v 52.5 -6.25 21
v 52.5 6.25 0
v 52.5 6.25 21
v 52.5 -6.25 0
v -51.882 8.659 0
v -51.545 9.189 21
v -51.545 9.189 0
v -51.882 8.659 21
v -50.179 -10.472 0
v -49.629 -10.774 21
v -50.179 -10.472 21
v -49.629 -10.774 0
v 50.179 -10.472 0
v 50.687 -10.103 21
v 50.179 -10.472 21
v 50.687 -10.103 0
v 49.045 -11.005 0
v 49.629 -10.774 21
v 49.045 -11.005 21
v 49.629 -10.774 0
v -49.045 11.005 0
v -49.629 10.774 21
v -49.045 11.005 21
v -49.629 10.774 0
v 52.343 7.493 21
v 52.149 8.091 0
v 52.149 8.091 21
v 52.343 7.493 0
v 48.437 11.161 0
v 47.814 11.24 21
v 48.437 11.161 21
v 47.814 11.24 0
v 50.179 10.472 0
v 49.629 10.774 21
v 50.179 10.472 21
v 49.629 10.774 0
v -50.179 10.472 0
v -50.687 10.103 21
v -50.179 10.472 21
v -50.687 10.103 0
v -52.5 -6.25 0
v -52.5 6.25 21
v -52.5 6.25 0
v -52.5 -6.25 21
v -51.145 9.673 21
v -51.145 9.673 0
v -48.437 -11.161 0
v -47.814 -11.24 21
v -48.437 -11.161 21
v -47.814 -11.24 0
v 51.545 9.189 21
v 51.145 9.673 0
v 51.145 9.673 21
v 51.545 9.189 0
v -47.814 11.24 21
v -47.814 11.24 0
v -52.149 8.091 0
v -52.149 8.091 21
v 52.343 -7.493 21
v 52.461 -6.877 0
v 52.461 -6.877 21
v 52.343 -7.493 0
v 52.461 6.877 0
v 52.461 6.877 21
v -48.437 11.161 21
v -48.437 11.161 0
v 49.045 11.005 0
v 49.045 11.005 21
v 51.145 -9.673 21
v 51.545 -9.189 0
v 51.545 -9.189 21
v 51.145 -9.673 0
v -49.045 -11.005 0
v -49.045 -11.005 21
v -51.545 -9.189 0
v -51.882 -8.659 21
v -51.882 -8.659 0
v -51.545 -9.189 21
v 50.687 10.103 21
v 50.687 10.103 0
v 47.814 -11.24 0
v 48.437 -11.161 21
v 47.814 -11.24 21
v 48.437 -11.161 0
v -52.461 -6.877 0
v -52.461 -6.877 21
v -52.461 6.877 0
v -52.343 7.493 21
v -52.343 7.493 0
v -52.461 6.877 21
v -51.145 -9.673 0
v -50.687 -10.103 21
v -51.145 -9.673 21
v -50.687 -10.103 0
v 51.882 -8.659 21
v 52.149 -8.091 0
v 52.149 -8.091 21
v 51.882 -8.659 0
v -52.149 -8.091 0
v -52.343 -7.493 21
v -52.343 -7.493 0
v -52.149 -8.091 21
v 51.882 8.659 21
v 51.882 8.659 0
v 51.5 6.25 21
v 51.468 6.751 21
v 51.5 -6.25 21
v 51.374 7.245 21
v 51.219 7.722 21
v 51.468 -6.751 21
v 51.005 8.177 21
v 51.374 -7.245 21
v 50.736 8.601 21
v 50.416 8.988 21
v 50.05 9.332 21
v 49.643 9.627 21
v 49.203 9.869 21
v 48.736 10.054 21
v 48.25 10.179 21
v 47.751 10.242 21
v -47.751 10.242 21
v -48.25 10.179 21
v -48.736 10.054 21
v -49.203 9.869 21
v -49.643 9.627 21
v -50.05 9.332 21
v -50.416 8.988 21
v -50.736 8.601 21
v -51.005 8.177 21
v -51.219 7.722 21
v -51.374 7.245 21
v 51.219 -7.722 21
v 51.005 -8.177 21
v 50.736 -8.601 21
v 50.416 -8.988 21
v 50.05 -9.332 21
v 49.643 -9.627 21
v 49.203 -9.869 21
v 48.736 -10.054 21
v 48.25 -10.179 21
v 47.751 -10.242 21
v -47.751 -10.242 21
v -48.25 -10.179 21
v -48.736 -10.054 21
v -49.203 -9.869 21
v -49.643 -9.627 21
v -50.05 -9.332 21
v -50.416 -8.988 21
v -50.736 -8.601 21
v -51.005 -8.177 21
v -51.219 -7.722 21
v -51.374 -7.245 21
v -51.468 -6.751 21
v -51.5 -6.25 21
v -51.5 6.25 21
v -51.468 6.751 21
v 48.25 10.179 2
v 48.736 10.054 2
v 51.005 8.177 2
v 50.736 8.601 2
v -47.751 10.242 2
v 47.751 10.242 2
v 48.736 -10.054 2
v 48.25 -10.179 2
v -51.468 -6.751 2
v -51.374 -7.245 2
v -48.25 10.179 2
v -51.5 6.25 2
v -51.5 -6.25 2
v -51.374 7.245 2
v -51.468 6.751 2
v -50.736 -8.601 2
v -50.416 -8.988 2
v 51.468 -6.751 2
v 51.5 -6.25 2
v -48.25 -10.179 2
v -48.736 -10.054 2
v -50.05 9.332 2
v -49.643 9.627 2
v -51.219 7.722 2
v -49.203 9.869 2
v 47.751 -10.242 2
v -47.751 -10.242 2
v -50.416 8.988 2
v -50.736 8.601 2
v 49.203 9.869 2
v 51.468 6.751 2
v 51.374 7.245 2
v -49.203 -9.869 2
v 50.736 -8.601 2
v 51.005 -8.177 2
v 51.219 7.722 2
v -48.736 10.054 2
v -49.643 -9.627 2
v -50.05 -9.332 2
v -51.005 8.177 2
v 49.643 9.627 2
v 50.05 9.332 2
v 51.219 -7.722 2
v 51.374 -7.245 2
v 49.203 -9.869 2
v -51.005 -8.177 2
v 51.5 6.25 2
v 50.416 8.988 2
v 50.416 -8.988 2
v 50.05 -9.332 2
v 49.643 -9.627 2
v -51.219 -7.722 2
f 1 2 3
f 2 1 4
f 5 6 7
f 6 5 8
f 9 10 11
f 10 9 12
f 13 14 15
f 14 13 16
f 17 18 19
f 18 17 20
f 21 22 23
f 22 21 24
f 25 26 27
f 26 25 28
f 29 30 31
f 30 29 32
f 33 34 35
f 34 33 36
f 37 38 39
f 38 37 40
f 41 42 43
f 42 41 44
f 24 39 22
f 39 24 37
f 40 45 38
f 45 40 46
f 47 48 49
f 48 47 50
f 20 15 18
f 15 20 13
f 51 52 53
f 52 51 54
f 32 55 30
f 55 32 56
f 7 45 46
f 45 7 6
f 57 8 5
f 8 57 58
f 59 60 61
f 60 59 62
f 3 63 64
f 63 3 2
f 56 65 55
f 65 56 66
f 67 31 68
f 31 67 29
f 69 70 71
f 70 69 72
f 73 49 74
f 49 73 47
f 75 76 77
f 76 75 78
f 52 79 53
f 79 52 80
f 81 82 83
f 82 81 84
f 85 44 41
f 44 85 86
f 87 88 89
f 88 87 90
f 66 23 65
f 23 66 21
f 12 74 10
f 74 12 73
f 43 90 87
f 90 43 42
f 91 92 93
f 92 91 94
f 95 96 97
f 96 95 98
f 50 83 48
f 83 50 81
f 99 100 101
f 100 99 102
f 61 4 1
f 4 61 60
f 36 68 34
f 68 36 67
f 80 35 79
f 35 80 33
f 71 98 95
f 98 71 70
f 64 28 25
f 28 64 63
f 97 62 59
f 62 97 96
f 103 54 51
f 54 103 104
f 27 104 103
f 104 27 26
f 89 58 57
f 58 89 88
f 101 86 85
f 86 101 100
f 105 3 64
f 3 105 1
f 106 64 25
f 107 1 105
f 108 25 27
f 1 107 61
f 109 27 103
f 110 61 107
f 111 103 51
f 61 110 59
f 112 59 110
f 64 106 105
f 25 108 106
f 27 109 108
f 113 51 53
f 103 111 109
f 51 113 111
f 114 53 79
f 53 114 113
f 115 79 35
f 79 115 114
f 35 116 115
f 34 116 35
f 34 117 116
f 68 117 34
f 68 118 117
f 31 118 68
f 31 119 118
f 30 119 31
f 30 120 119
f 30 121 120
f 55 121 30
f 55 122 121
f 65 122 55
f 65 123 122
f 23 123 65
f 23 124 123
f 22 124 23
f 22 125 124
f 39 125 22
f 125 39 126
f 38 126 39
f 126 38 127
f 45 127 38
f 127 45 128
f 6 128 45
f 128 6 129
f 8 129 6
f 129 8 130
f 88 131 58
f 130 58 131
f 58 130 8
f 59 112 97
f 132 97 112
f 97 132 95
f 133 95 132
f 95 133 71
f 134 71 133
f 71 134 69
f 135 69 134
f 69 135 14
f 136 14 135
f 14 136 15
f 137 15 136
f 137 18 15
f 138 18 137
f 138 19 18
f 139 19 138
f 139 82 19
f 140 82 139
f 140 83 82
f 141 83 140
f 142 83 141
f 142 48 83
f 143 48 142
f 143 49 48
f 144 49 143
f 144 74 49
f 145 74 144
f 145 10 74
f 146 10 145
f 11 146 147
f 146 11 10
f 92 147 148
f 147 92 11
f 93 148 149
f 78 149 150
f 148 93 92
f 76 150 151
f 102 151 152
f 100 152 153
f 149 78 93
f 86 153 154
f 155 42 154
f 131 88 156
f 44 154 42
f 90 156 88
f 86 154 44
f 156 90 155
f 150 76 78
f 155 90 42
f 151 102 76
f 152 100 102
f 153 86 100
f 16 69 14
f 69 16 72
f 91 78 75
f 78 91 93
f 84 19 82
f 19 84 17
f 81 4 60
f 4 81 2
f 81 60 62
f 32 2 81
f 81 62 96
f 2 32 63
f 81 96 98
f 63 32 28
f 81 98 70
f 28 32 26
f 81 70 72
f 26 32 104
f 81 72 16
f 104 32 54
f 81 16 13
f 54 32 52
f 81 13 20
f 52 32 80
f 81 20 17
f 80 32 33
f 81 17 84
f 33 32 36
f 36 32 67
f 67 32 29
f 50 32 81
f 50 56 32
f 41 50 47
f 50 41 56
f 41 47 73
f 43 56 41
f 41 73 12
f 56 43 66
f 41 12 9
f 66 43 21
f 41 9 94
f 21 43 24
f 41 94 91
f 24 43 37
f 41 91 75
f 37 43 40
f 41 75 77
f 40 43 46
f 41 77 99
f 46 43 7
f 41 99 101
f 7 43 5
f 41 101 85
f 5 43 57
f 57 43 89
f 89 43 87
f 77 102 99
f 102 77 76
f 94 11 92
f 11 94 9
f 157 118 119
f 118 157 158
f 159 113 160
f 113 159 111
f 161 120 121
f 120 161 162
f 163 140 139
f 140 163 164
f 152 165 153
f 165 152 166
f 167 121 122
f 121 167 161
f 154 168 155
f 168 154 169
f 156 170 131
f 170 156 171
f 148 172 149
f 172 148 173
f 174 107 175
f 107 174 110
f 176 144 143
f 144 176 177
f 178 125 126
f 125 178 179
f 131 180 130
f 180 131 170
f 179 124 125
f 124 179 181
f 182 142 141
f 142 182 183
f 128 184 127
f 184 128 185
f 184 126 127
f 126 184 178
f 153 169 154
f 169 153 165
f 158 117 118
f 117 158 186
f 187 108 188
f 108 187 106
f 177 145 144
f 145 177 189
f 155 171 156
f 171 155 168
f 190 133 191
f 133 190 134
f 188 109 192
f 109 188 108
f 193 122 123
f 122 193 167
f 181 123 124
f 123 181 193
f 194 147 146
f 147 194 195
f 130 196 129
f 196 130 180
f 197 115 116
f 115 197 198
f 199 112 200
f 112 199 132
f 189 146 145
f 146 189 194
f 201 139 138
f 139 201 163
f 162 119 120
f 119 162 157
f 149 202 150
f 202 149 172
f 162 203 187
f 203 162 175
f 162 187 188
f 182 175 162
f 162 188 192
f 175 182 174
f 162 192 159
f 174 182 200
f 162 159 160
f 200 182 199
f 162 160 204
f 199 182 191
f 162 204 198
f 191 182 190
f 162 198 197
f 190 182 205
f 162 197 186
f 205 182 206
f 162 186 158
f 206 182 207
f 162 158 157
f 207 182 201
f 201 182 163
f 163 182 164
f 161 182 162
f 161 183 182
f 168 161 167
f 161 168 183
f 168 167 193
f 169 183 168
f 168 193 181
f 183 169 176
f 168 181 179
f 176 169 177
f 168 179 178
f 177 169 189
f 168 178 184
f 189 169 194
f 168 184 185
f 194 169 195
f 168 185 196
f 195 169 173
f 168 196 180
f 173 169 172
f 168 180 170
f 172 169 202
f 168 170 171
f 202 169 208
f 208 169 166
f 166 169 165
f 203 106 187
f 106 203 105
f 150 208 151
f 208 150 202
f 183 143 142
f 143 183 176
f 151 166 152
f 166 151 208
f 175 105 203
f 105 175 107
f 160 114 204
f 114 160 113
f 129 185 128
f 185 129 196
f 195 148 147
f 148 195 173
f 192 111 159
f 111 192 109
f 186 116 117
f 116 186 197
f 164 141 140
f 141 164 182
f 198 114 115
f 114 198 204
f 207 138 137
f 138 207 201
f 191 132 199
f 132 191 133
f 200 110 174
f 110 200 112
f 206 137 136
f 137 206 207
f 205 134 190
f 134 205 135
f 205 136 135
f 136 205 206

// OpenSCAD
$fn = 50;


difference() {
	union() {
		hull() {
			translate(v = [-47.5000000000, 6.2500000000, 0]) {
				cylinder(h = 21, r = 5);
			}
			translate(v = [47.5000000000, 6.2500000000, 0]) {
				cylinder(h = 21, r = 5);
			}
			translate(v = [-47.5000000000, -6.2500000000, 0]) {
				cylinder(h = 21, r = 5);
			}
			translate(v = [47.5000000000, -6.2500000000, 0]) {
				cylinder(h = 21, r = 5);
			}
		}
	}
	union() {
		translate(v = [0, 0, 2]) {
			hull() {
				translate(v = [-47.5000000000, 6.2500000000, 0]) {
					cylinder(h = 19, r = 4);
				}
				translate(v = [47.5000000000, 6.2500000000, 0]) {
					cylinder(h = 19, r = 4);
				}
				translate(v = [-47.5000000000, -6.2500000000, 0]) {
					cylinder(h = 19, r = 4);
				}
				translate(v = [47.5000000000, -6.2500000000, 0]) {
					cylinder(h = 19, r = 4);
				}
			}
		}
	}
}
